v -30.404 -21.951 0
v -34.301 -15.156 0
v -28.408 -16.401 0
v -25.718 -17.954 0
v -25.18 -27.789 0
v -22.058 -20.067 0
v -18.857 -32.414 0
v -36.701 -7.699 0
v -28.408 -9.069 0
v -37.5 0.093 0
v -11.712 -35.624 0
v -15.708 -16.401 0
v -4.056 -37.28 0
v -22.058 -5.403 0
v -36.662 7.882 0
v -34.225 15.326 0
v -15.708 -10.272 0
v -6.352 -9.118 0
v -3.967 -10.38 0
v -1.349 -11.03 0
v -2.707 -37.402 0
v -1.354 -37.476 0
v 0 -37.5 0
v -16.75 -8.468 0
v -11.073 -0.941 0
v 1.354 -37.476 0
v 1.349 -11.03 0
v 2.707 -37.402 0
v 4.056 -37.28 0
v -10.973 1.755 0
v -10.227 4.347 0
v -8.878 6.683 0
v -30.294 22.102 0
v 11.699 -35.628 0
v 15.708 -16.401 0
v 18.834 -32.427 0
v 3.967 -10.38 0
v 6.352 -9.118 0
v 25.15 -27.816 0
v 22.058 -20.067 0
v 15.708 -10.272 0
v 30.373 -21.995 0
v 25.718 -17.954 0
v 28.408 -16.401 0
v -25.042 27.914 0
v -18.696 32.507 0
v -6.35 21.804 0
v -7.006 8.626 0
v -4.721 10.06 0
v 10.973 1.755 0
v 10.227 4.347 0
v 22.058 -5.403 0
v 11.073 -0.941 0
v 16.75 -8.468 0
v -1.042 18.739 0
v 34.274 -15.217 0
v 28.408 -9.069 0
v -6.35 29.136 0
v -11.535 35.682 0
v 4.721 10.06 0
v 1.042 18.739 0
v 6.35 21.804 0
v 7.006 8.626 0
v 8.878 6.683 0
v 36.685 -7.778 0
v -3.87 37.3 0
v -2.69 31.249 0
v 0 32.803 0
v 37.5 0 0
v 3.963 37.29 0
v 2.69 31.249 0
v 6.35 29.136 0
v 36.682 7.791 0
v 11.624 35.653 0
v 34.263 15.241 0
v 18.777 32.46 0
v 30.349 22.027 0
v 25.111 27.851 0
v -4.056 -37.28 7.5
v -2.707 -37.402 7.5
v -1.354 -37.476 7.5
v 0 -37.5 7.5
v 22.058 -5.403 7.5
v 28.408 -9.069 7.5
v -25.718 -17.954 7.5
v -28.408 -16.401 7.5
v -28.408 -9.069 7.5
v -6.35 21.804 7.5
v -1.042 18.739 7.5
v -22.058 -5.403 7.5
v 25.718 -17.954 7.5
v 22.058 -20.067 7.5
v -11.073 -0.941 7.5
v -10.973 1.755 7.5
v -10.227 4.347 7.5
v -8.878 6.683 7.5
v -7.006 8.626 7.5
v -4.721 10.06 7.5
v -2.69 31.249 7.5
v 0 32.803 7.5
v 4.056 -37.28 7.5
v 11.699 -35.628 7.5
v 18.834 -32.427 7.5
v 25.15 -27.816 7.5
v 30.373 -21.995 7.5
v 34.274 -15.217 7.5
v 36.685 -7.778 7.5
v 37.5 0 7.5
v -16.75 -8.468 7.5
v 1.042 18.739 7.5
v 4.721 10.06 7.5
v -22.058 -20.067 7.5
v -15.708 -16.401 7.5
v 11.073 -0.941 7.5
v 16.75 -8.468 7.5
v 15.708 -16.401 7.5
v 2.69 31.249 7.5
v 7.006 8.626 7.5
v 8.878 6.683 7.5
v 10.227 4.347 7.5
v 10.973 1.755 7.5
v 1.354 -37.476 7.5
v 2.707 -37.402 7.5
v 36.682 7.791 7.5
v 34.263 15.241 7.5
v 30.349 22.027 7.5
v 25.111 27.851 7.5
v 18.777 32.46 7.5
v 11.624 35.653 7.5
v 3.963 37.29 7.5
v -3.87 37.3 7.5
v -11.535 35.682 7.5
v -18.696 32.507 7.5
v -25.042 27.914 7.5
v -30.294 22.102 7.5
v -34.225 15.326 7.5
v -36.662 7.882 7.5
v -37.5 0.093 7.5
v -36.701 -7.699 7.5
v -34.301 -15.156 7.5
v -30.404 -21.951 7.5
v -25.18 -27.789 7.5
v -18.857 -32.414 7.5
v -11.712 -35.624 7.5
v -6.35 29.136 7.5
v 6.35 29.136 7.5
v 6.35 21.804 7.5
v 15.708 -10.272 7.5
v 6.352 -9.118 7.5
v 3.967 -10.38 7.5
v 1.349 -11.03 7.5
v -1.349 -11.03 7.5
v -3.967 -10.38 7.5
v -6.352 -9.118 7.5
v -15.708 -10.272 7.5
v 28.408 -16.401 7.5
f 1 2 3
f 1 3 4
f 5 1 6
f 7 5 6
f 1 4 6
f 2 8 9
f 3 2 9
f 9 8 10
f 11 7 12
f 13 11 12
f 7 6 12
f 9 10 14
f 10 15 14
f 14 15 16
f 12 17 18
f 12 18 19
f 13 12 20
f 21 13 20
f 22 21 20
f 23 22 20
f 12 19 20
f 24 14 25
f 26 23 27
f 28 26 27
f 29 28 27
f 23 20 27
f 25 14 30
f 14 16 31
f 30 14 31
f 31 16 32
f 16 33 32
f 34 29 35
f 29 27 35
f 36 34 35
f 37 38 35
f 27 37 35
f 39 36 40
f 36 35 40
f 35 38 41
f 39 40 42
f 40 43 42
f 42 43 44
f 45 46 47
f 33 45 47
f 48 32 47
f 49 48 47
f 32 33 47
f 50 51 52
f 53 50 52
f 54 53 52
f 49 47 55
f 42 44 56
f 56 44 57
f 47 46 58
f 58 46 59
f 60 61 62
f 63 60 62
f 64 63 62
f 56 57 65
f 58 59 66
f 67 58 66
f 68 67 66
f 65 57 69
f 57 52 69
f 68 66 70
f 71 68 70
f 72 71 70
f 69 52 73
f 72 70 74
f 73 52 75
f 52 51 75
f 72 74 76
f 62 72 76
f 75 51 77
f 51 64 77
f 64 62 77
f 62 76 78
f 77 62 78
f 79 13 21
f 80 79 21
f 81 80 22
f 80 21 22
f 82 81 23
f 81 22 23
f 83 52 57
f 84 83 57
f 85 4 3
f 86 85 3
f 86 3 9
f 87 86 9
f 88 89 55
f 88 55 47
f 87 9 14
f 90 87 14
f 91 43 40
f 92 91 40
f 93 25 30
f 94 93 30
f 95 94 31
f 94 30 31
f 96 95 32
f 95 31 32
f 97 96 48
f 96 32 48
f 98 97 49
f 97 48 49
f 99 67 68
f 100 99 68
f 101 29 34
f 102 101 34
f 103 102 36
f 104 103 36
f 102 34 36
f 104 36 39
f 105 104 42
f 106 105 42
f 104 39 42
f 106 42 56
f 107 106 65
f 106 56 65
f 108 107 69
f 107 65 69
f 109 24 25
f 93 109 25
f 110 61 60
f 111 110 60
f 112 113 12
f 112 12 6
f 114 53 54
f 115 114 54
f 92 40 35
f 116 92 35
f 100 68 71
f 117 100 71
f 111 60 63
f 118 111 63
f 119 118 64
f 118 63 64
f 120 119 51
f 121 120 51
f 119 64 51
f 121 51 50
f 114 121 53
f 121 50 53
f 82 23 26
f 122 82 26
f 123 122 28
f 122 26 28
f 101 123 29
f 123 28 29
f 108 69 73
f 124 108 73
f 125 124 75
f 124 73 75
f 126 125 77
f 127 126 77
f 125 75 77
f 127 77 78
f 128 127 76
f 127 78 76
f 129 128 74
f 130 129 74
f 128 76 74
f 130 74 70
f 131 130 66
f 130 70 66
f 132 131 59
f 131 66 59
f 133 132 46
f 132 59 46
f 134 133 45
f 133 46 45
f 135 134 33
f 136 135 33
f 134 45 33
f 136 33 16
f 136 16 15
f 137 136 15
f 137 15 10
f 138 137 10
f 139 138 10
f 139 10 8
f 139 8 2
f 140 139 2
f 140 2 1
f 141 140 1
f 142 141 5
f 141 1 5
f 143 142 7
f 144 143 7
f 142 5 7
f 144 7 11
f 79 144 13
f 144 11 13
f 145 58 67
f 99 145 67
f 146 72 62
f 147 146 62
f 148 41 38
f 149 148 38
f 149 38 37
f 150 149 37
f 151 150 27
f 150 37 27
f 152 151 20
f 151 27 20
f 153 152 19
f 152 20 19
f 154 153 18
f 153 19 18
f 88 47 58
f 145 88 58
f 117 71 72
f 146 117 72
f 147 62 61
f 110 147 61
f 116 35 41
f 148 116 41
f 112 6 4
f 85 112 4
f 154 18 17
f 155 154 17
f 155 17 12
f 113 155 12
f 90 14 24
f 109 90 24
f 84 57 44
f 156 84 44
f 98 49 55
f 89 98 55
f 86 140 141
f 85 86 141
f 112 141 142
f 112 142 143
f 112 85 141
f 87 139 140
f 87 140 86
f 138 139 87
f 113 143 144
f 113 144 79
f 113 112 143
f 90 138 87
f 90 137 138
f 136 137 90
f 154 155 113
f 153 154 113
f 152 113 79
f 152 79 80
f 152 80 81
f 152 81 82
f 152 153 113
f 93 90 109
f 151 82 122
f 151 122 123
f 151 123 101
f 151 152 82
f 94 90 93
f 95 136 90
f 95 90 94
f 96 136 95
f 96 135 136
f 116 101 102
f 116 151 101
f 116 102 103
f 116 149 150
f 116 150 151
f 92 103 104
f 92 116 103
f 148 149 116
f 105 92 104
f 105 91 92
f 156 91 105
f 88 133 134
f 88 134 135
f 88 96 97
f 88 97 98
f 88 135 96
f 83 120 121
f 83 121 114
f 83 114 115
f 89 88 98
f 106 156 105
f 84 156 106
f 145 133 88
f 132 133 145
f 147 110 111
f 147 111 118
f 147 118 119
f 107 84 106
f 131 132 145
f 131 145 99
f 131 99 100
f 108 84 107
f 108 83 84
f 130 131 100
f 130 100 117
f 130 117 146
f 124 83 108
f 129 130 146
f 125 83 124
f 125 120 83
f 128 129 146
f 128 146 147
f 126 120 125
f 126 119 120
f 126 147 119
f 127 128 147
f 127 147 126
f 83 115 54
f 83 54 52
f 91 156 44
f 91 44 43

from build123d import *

# Parameters (mm, degrees)
F1_DEPTH = 7.5


# Not quite as in the source:
# - ends of sketch curves that miss each other by under 0.0002 mm in the source are joined


with BuildPart() as f1:
    # F0 (on Top) → F1 (new body)
    with BuildSketch(Plane.XY):
        with BuildLine():
            ThreePointArc((4.0556630512, -37.2800428811), (27.913593144, -25.0415917583), (37.5, 0))
            ThreePointArc((37.5, 0), (-25.0415917583, 27.913593144), (-4.0556630512, -37.2800428811))
            ThreePointArc((-4.0556630512, -37.2800428811), (-2.0308116554, -37.4449703434), (0, -37.5))
            ThreePointArc((0, -37.5), (2.0308116554, -37.4449703434), (4.0556630512, -37.2800428811))
        make_face()
        with BuildLine():
            ThreePointArc((-28.4078604382, -13.2949914876), (-27.1628882386, 15.6825009444), (-2.6901296616, 31.2494245665))
            Line((-2.6901296616, 31.2494245665), (7.92e-08, 32.8025716965))
            Line((7.92e-08, 32.8025716965), (2.6901298478, 31.2494245505))
            ThreePointArc((2.6901298478, 31.2494245505), (23.109946567, 21.2059827173), (31.365001727, 0))
            ThreePointArc((31.365001727, 0), (30.6167921454, -6.8099465531), (28.407860359, -13.2949916568))
            Line((28.407860359, -13.2949916568), (28.407860359, -16.4012859168))
            Line((28.407860359, -16.4012859168), (25.7177305905, -17.9544330629))
            ThreePointArc((25.7177305905, -17.9544330629), (-9.34e-08, -31.365001727), (-25.7177306974, -17.9544329097))
            Line((-25.7177306974, -17.9544329097), (-28.4078604382, -16.4012857797))
            Line((-28.4078604382, -16.4012857797), (-28.4078604382, -13.2949914876))
        make_face(mode=Mode.SUBTRACT)
        with BuildLine():
            ThreePointArc((-11.0725523918, -0.9414030915), (-9.6237073053, 5.5562499901), (-4.7209972243, 10.059813192))
            Line((-4.7209972243, 10.059813192), (-1.0416995056, 18.7393003948))
            Line((-1.0416995056, 18.7393003948), (-6.3499999208, 21.8040490685))
            Line((-6.3499999208, 21.8040490685), (-6.3499999208, 29.1363974872))
            Line((-6.3499999208, 29.1363974872), (-2.6901296616, 31.2494245665))
            ThreePointArc((-2.6901296616, 31.2494245665), (-27.1628882386, 15.6825009444), (-28.4078604382, -13.2949914876))
            Line((-28.4078604382, -13.2949914876), (-28.4078604382, -9.068937361))
            Line((-28.4078604382, -9.068937361), (-22.0578604382, -5.4027631516))
            Line((-22.0578604382, -5.4027631516), (-16.7495600286, -8.467511822))
            Line((-16.7495600286, -8.467511822), (-11.0725523918, -0.9414030915))
        make_face()
        with BuildLine():
            Line((6.3500000792, 21.8040490685), (1.0416996696, 18.739300398))
            Line((1.0416996696, 18.739300398), (4.7209974611, 10.0598130809))
            ThreePointArc((4.7209974611, 10.0598130809), (9.6237072938, 5.5562500099), (11.0725524179, -0.941402785))
            Line((11.0725524179, -0.941402785), (16.7495599439, -8.4675119624))
            Line((16.7495599439, -8.4675119624), (22.057860359, -5.4027632888))
            Line((22.057860359, -5.4027632888), (28.407860359, -9.0689374981))
            Line((28.407860359, -9.0689374981), (28.407860359, -13.2949916568))
            ThreePointArc((28.407860359, -13.2949916568), (30.6167921454, -6.8099465531), (31.365001727, 0))
            ThreePointArc((31.365001727, 0), (23.109946567, 21.2059827173), (2.6901298478, 31.2494245505))
            Line((2.6901298478, 31.2494245505), (6.3500000792, 29.1363974872))
            Line((6.3500000792, 29.1363974872), (6.3500000792, 21.8040490685))
        make_face()
        with BuildLine():
            Line((-6.3515551695, -9.1184101234), (-15.7078604382, -10.2717884324))
            Line((-15.7078604382, -10.2717884324), (-15.7078604382, -16.4012857797))
            Line((-15.7078604382, -16.4012857797), (-22.0578604382, -20.067459989))
            Line((-22.0578604382, -20.067459989), (-25.7177306974, -17.9544329097))
            ThreePointArc((-25.7177306974, -17.9544329097), (-9.34e-08, -31.365001727), (25.7177305905, -17.9544330629))
            Line((25.7177305905, -17.9544330629), (22.057860359, -20.0674601262))
            Line((22.057860359, -20.0674601262), (15.707860359, -16.4012859168))
            Line((15.707860359, -16.4012859168), (15.707860359, -10.271788576))
            Line((15.707860359, -10.271788576), (6.3515549548, -9.118410273))
            ThreePointArc((6.3515549548, -9.118410273), (-1.15e-08, -11.1125), (-6.3515551695, -9.1184101234))
        make_face()
    extrude(amount=F1_DEPTH)


solid = f1.part
